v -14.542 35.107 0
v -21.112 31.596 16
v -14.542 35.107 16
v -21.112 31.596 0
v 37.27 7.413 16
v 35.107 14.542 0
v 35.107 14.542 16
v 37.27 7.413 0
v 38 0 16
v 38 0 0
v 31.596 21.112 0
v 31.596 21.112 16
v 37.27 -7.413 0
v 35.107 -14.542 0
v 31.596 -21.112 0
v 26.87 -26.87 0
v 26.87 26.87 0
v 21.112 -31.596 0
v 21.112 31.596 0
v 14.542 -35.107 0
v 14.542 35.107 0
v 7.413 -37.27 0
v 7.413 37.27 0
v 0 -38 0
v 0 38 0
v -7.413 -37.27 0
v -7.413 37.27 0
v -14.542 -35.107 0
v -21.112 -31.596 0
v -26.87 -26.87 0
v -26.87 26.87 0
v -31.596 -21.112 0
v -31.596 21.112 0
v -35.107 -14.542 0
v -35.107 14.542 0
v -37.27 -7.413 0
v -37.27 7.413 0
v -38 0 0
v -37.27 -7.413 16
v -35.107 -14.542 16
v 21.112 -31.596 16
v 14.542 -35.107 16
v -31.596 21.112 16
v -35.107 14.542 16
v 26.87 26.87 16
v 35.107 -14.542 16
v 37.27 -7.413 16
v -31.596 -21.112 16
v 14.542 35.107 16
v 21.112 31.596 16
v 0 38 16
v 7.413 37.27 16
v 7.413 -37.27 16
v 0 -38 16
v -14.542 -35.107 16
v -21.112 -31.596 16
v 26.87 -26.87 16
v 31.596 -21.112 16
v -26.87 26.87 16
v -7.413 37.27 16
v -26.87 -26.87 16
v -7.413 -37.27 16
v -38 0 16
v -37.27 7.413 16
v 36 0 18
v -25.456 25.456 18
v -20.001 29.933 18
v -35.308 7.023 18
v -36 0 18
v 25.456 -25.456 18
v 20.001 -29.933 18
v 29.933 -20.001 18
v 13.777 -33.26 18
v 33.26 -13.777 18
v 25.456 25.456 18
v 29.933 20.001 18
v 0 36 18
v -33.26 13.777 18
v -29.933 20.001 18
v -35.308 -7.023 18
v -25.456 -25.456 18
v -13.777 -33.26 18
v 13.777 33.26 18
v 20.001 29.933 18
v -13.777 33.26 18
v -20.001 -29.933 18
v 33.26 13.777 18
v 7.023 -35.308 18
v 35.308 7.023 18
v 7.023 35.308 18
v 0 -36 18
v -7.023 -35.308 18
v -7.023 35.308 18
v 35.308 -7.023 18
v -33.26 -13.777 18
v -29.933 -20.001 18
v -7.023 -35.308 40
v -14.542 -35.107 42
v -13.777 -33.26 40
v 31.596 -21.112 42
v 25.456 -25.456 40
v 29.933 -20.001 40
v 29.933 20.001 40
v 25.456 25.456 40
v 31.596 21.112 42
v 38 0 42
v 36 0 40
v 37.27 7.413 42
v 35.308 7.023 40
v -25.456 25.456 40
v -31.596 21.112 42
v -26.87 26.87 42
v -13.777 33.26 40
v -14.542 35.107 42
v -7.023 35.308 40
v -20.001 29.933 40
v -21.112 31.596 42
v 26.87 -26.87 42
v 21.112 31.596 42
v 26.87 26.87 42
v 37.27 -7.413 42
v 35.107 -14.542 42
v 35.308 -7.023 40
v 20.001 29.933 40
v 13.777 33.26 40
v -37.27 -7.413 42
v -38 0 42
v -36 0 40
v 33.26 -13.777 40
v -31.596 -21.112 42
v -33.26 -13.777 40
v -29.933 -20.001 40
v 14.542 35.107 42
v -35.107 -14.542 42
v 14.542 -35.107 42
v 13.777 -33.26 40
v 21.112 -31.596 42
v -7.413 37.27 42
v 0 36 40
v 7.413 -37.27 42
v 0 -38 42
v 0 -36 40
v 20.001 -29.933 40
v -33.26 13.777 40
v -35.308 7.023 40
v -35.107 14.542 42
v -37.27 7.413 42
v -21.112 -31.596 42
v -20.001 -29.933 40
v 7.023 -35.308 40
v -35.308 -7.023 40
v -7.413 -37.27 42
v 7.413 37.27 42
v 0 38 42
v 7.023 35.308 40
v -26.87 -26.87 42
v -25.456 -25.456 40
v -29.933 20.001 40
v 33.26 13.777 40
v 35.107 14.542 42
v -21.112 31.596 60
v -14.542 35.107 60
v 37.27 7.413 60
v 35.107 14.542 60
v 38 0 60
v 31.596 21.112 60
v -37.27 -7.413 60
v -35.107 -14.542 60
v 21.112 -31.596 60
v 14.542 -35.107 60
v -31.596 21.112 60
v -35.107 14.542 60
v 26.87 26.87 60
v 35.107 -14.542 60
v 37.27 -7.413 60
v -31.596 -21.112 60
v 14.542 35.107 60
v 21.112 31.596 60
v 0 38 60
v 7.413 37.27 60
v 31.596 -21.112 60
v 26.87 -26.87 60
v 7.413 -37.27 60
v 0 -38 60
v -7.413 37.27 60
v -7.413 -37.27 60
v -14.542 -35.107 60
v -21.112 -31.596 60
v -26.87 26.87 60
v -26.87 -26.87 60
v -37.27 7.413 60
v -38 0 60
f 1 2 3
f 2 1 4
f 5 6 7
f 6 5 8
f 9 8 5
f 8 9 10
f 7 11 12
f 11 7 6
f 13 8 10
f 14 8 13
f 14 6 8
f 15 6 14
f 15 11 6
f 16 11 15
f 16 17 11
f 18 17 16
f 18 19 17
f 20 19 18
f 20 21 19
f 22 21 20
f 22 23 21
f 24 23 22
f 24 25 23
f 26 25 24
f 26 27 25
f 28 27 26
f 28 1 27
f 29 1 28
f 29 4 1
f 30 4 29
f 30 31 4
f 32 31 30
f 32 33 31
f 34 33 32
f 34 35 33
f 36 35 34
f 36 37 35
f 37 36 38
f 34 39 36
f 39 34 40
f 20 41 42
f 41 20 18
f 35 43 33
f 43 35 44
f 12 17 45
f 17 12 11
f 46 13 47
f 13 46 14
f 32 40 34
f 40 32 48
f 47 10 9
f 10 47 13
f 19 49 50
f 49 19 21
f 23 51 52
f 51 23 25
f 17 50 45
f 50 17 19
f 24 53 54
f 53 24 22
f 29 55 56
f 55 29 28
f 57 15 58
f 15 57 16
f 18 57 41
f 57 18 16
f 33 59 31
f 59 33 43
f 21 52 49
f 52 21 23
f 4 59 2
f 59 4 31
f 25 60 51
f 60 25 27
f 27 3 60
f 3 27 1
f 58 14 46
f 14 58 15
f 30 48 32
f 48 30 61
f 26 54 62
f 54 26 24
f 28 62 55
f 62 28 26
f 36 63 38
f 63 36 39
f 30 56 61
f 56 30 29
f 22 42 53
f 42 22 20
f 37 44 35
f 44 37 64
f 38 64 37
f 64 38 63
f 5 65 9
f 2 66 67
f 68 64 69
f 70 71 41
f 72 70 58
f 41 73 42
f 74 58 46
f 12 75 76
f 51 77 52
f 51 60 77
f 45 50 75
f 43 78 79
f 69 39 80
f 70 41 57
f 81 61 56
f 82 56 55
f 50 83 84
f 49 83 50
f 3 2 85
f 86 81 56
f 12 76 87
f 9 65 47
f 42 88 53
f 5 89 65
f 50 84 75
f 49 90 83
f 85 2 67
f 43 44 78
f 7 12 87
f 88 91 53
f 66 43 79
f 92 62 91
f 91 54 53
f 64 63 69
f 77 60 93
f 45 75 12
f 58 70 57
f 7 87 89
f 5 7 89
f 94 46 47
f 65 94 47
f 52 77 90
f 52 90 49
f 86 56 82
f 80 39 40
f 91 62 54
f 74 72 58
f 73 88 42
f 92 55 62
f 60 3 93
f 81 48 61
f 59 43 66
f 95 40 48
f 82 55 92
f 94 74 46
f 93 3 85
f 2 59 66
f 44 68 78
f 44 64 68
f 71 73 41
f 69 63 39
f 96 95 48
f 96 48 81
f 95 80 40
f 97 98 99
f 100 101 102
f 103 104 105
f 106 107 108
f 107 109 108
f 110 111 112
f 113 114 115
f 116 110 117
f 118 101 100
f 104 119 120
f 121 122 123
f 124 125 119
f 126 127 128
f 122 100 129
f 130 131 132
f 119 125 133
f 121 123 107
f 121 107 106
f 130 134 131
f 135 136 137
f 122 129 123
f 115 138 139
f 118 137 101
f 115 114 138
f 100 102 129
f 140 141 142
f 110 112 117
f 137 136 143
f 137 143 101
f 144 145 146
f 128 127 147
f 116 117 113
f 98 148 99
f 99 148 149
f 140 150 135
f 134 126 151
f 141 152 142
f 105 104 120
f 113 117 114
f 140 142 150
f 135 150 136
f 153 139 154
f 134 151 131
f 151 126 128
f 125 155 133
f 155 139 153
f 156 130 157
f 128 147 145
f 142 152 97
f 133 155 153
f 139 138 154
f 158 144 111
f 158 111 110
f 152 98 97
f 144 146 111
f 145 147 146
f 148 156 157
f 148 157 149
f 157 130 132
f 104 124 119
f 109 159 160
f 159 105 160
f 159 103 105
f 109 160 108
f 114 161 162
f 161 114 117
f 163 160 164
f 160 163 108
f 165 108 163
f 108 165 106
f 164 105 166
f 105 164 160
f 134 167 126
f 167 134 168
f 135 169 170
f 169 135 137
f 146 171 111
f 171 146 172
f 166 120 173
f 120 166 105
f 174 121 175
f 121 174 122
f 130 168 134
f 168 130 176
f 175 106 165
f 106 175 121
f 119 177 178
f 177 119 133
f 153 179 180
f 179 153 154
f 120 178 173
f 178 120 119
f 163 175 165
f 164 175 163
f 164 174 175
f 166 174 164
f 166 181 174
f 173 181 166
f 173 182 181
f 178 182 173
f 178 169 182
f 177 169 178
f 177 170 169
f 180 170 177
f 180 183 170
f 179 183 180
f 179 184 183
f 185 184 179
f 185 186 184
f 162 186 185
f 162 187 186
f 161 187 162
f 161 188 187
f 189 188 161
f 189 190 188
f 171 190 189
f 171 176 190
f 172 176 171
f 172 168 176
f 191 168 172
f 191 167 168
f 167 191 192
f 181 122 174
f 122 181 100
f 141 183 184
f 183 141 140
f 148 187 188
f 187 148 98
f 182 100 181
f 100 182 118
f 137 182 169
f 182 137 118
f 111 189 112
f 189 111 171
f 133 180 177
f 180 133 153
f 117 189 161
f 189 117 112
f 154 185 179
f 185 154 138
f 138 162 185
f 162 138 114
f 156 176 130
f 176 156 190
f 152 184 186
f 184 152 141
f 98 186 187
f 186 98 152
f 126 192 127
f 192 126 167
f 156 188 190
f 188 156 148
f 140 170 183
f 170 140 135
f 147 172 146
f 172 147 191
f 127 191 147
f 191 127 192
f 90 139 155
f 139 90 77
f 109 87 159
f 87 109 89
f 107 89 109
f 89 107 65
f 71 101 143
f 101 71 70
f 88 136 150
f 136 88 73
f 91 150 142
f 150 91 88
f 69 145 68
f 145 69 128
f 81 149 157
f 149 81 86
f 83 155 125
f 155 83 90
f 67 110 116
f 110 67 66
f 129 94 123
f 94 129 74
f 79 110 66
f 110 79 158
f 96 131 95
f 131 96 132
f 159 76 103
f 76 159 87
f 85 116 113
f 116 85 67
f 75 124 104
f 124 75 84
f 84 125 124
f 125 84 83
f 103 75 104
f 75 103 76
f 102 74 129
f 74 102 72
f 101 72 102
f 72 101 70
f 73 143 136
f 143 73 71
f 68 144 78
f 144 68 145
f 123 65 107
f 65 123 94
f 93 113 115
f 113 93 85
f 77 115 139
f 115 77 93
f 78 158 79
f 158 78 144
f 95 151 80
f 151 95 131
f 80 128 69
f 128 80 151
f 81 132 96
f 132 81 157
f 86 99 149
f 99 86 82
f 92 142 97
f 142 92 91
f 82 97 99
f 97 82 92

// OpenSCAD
use <main.scad>
lidar_pos_x        = 368;
lidar_mount_height = 390;
lidar_diameter     = 76;
lidar_height       = 60;
show_component_labels = false;
translate([-lidar_pos_x, 0, -lidar_mount_height])
    lidar_unit();
